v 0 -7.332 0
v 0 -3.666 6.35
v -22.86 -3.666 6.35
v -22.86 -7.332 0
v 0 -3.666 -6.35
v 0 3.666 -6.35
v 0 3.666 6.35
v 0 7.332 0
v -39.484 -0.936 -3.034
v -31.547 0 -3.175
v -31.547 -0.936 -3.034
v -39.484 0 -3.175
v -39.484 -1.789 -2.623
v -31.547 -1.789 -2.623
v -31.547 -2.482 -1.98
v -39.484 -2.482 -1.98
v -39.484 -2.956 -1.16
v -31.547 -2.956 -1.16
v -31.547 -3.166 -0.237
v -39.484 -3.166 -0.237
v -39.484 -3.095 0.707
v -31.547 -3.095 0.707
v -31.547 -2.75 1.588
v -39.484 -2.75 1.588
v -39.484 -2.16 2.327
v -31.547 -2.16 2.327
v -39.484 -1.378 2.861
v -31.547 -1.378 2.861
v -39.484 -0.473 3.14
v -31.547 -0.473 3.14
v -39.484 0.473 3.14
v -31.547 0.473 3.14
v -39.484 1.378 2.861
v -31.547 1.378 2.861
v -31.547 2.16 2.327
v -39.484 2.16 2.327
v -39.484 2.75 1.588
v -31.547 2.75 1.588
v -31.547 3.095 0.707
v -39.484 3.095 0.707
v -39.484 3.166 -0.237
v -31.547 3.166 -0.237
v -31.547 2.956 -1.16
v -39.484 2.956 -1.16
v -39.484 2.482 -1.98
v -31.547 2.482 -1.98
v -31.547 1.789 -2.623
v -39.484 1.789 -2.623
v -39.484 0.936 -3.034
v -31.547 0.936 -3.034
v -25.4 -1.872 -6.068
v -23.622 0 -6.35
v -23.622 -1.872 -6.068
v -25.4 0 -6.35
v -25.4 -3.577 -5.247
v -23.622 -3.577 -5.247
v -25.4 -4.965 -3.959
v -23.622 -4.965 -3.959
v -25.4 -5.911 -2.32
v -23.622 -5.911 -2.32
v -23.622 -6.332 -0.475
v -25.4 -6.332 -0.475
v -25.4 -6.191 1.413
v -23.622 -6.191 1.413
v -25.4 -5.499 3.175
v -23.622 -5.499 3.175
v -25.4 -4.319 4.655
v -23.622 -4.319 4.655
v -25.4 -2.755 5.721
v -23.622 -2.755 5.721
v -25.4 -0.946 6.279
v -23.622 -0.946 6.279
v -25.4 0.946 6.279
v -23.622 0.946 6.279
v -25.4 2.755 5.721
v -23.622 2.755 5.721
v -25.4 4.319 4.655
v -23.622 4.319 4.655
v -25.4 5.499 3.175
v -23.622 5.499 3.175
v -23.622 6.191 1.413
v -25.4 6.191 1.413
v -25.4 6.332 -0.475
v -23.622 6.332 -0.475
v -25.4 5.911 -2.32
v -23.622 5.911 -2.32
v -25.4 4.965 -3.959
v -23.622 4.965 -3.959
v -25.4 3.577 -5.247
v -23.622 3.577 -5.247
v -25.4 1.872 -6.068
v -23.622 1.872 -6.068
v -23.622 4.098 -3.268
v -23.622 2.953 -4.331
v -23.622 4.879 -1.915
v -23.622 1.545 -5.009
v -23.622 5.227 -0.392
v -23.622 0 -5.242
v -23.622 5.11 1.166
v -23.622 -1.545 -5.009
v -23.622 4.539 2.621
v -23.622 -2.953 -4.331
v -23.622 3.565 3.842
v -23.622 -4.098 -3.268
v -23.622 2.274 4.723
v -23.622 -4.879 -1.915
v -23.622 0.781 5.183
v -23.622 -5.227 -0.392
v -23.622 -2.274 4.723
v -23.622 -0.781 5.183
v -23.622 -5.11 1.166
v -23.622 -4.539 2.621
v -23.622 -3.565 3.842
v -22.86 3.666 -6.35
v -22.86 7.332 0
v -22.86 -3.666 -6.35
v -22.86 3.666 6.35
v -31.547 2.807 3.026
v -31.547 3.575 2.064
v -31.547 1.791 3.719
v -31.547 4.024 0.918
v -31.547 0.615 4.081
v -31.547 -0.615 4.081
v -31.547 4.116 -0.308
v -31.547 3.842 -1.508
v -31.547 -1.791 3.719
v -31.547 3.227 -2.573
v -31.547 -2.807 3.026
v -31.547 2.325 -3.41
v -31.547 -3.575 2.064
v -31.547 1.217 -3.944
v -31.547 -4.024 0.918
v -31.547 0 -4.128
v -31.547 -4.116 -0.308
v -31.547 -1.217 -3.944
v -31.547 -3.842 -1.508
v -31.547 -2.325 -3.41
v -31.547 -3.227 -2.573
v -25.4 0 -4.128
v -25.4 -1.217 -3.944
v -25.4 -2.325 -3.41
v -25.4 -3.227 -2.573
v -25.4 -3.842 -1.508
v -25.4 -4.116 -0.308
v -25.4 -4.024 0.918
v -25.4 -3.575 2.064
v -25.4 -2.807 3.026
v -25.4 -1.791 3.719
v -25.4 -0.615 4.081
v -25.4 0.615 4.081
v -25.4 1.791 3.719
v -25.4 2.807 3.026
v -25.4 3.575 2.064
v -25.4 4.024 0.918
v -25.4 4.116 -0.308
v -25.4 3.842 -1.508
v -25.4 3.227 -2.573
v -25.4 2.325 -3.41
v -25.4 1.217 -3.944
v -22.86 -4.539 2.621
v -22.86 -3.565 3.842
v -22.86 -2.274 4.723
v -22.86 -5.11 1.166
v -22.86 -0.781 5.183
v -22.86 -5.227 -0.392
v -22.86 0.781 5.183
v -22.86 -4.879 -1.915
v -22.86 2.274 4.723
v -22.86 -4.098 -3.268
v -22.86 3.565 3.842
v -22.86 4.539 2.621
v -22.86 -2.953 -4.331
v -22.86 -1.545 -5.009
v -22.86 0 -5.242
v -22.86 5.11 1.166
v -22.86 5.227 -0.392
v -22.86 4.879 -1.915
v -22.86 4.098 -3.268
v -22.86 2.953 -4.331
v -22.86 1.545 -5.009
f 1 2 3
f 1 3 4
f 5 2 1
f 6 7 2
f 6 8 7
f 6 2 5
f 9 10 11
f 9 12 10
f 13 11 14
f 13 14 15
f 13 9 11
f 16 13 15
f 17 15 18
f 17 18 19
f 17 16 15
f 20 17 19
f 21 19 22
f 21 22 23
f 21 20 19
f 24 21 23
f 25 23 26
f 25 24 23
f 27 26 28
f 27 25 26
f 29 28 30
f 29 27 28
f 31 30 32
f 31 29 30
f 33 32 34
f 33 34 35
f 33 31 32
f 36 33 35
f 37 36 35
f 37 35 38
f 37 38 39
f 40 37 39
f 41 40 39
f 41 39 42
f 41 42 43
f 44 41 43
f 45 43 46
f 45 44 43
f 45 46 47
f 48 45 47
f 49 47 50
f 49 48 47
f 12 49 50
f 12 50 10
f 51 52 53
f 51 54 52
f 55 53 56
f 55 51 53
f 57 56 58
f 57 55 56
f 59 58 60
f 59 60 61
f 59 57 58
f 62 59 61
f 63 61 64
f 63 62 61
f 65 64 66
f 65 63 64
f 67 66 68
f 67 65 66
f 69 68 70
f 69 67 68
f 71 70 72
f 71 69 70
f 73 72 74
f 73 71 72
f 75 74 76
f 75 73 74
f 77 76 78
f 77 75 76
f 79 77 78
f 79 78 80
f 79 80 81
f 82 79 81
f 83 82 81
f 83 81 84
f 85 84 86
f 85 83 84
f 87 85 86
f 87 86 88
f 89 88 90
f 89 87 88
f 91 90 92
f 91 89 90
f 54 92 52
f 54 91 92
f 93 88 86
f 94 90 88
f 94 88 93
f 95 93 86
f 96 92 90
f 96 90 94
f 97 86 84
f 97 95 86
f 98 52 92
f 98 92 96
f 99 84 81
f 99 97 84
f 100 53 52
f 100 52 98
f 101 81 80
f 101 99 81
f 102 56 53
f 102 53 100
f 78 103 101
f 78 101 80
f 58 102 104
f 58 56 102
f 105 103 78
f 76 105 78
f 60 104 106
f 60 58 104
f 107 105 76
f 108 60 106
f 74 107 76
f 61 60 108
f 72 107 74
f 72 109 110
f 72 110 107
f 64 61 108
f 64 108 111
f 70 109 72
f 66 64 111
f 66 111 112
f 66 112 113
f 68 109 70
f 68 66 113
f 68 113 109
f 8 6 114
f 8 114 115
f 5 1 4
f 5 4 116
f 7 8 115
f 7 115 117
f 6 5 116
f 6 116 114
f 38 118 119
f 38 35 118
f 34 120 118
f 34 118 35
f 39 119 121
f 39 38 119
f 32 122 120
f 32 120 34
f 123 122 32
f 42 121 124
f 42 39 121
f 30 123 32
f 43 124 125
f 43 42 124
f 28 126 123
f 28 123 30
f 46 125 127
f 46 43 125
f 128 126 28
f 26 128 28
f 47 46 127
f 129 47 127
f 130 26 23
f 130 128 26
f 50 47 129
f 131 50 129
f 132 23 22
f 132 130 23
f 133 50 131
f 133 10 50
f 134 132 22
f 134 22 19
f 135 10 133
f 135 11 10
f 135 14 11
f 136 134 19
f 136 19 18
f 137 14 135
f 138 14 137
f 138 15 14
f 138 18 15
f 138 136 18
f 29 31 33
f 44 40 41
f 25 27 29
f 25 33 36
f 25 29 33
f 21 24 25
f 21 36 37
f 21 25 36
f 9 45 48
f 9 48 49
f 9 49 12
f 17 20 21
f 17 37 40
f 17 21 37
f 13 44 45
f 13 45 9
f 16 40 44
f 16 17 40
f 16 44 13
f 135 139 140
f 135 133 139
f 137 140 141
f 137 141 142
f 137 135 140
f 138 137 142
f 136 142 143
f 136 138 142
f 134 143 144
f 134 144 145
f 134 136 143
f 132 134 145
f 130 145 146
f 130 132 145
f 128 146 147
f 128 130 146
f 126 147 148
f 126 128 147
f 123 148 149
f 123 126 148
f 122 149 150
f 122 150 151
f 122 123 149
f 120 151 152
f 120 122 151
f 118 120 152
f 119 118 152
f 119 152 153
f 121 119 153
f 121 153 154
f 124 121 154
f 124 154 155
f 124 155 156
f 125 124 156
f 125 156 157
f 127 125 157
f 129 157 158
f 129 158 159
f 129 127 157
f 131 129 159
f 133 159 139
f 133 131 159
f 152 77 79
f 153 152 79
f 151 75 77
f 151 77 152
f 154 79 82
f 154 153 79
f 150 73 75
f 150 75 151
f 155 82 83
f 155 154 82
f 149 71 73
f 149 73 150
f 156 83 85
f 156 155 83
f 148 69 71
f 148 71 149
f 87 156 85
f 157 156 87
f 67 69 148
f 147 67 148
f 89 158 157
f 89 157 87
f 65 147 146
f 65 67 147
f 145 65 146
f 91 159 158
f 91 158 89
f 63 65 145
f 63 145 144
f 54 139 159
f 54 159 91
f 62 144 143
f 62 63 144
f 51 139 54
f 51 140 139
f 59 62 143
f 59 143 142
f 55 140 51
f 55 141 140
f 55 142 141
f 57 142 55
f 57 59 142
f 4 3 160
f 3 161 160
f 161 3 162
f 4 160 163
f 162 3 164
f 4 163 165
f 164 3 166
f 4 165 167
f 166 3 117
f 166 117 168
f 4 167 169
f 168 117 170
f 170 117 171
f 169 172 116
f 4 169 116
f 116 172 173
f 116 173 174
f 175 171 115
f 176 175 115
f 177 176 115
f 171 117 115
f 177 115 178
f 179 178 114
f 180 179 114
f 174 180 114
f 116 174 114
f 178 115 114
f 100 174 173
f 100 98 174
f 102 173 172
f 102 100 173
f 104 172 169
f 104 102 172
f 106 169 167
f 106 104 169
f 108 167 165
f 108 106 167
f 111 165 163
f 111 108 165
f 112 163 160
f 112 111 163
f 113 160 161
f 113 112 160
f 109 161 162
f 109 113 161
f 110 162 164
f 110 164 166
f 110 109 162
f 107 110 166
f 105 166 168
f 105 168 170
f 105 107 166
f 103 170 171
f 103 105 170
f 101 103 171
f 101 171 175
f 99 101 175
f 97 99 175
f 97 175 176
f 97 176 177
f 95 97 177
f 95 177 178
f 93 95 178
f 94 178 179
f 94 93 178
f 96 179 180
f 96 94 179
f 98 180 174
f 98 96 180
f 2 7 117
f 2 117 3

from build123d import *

# Parameters (mm, degrees)
BOSS_EXTRUDE1_DEPTH = 22.86


with BuildPart() as part:
    # Sketch1 → Revolve1 (revolve)
    with BuildSketch(Plane.XY, mode=Mode.PRIVATE) as revolve1_sk:
        Polygon((0, 0), (0, 6.35), (-22.86, 6.35), (-22.86, 5.241687437), (-23.622, 5.241687437), (-23.622, 6.35), (-25.4, 6.35), (-25.4, 4.1275), (-31.5468, 4.1275), (-31.5468, 3.175), (-39.4843, 3.175), (-39.4843, 0), align=None)
    revolve(revolve1_sk.sketch.rotate(Axis((0, 0, 0), (-1, 0, 0)), 90), axis=Axis((0, 0, 0), (-1, 0, 0)))

    # Sketch2 → Boss-Extrude1 (add)
    with BuildSketch(Plane(origin=(0, 0, 0), x_dir=(0, 0, -1), z_dir=(1, 0, 0))):
        Polygon((-6.35, 3.666174209), (-6.35, -3.666174209), (0, -7.332348419), (6.35, -3.666174209), (6.35, 3.666174209), (0, 7.332348419), align=None)
    extrude(amount=-BOSS_EXTRUDE1_DEPTH)


solid = part.part
